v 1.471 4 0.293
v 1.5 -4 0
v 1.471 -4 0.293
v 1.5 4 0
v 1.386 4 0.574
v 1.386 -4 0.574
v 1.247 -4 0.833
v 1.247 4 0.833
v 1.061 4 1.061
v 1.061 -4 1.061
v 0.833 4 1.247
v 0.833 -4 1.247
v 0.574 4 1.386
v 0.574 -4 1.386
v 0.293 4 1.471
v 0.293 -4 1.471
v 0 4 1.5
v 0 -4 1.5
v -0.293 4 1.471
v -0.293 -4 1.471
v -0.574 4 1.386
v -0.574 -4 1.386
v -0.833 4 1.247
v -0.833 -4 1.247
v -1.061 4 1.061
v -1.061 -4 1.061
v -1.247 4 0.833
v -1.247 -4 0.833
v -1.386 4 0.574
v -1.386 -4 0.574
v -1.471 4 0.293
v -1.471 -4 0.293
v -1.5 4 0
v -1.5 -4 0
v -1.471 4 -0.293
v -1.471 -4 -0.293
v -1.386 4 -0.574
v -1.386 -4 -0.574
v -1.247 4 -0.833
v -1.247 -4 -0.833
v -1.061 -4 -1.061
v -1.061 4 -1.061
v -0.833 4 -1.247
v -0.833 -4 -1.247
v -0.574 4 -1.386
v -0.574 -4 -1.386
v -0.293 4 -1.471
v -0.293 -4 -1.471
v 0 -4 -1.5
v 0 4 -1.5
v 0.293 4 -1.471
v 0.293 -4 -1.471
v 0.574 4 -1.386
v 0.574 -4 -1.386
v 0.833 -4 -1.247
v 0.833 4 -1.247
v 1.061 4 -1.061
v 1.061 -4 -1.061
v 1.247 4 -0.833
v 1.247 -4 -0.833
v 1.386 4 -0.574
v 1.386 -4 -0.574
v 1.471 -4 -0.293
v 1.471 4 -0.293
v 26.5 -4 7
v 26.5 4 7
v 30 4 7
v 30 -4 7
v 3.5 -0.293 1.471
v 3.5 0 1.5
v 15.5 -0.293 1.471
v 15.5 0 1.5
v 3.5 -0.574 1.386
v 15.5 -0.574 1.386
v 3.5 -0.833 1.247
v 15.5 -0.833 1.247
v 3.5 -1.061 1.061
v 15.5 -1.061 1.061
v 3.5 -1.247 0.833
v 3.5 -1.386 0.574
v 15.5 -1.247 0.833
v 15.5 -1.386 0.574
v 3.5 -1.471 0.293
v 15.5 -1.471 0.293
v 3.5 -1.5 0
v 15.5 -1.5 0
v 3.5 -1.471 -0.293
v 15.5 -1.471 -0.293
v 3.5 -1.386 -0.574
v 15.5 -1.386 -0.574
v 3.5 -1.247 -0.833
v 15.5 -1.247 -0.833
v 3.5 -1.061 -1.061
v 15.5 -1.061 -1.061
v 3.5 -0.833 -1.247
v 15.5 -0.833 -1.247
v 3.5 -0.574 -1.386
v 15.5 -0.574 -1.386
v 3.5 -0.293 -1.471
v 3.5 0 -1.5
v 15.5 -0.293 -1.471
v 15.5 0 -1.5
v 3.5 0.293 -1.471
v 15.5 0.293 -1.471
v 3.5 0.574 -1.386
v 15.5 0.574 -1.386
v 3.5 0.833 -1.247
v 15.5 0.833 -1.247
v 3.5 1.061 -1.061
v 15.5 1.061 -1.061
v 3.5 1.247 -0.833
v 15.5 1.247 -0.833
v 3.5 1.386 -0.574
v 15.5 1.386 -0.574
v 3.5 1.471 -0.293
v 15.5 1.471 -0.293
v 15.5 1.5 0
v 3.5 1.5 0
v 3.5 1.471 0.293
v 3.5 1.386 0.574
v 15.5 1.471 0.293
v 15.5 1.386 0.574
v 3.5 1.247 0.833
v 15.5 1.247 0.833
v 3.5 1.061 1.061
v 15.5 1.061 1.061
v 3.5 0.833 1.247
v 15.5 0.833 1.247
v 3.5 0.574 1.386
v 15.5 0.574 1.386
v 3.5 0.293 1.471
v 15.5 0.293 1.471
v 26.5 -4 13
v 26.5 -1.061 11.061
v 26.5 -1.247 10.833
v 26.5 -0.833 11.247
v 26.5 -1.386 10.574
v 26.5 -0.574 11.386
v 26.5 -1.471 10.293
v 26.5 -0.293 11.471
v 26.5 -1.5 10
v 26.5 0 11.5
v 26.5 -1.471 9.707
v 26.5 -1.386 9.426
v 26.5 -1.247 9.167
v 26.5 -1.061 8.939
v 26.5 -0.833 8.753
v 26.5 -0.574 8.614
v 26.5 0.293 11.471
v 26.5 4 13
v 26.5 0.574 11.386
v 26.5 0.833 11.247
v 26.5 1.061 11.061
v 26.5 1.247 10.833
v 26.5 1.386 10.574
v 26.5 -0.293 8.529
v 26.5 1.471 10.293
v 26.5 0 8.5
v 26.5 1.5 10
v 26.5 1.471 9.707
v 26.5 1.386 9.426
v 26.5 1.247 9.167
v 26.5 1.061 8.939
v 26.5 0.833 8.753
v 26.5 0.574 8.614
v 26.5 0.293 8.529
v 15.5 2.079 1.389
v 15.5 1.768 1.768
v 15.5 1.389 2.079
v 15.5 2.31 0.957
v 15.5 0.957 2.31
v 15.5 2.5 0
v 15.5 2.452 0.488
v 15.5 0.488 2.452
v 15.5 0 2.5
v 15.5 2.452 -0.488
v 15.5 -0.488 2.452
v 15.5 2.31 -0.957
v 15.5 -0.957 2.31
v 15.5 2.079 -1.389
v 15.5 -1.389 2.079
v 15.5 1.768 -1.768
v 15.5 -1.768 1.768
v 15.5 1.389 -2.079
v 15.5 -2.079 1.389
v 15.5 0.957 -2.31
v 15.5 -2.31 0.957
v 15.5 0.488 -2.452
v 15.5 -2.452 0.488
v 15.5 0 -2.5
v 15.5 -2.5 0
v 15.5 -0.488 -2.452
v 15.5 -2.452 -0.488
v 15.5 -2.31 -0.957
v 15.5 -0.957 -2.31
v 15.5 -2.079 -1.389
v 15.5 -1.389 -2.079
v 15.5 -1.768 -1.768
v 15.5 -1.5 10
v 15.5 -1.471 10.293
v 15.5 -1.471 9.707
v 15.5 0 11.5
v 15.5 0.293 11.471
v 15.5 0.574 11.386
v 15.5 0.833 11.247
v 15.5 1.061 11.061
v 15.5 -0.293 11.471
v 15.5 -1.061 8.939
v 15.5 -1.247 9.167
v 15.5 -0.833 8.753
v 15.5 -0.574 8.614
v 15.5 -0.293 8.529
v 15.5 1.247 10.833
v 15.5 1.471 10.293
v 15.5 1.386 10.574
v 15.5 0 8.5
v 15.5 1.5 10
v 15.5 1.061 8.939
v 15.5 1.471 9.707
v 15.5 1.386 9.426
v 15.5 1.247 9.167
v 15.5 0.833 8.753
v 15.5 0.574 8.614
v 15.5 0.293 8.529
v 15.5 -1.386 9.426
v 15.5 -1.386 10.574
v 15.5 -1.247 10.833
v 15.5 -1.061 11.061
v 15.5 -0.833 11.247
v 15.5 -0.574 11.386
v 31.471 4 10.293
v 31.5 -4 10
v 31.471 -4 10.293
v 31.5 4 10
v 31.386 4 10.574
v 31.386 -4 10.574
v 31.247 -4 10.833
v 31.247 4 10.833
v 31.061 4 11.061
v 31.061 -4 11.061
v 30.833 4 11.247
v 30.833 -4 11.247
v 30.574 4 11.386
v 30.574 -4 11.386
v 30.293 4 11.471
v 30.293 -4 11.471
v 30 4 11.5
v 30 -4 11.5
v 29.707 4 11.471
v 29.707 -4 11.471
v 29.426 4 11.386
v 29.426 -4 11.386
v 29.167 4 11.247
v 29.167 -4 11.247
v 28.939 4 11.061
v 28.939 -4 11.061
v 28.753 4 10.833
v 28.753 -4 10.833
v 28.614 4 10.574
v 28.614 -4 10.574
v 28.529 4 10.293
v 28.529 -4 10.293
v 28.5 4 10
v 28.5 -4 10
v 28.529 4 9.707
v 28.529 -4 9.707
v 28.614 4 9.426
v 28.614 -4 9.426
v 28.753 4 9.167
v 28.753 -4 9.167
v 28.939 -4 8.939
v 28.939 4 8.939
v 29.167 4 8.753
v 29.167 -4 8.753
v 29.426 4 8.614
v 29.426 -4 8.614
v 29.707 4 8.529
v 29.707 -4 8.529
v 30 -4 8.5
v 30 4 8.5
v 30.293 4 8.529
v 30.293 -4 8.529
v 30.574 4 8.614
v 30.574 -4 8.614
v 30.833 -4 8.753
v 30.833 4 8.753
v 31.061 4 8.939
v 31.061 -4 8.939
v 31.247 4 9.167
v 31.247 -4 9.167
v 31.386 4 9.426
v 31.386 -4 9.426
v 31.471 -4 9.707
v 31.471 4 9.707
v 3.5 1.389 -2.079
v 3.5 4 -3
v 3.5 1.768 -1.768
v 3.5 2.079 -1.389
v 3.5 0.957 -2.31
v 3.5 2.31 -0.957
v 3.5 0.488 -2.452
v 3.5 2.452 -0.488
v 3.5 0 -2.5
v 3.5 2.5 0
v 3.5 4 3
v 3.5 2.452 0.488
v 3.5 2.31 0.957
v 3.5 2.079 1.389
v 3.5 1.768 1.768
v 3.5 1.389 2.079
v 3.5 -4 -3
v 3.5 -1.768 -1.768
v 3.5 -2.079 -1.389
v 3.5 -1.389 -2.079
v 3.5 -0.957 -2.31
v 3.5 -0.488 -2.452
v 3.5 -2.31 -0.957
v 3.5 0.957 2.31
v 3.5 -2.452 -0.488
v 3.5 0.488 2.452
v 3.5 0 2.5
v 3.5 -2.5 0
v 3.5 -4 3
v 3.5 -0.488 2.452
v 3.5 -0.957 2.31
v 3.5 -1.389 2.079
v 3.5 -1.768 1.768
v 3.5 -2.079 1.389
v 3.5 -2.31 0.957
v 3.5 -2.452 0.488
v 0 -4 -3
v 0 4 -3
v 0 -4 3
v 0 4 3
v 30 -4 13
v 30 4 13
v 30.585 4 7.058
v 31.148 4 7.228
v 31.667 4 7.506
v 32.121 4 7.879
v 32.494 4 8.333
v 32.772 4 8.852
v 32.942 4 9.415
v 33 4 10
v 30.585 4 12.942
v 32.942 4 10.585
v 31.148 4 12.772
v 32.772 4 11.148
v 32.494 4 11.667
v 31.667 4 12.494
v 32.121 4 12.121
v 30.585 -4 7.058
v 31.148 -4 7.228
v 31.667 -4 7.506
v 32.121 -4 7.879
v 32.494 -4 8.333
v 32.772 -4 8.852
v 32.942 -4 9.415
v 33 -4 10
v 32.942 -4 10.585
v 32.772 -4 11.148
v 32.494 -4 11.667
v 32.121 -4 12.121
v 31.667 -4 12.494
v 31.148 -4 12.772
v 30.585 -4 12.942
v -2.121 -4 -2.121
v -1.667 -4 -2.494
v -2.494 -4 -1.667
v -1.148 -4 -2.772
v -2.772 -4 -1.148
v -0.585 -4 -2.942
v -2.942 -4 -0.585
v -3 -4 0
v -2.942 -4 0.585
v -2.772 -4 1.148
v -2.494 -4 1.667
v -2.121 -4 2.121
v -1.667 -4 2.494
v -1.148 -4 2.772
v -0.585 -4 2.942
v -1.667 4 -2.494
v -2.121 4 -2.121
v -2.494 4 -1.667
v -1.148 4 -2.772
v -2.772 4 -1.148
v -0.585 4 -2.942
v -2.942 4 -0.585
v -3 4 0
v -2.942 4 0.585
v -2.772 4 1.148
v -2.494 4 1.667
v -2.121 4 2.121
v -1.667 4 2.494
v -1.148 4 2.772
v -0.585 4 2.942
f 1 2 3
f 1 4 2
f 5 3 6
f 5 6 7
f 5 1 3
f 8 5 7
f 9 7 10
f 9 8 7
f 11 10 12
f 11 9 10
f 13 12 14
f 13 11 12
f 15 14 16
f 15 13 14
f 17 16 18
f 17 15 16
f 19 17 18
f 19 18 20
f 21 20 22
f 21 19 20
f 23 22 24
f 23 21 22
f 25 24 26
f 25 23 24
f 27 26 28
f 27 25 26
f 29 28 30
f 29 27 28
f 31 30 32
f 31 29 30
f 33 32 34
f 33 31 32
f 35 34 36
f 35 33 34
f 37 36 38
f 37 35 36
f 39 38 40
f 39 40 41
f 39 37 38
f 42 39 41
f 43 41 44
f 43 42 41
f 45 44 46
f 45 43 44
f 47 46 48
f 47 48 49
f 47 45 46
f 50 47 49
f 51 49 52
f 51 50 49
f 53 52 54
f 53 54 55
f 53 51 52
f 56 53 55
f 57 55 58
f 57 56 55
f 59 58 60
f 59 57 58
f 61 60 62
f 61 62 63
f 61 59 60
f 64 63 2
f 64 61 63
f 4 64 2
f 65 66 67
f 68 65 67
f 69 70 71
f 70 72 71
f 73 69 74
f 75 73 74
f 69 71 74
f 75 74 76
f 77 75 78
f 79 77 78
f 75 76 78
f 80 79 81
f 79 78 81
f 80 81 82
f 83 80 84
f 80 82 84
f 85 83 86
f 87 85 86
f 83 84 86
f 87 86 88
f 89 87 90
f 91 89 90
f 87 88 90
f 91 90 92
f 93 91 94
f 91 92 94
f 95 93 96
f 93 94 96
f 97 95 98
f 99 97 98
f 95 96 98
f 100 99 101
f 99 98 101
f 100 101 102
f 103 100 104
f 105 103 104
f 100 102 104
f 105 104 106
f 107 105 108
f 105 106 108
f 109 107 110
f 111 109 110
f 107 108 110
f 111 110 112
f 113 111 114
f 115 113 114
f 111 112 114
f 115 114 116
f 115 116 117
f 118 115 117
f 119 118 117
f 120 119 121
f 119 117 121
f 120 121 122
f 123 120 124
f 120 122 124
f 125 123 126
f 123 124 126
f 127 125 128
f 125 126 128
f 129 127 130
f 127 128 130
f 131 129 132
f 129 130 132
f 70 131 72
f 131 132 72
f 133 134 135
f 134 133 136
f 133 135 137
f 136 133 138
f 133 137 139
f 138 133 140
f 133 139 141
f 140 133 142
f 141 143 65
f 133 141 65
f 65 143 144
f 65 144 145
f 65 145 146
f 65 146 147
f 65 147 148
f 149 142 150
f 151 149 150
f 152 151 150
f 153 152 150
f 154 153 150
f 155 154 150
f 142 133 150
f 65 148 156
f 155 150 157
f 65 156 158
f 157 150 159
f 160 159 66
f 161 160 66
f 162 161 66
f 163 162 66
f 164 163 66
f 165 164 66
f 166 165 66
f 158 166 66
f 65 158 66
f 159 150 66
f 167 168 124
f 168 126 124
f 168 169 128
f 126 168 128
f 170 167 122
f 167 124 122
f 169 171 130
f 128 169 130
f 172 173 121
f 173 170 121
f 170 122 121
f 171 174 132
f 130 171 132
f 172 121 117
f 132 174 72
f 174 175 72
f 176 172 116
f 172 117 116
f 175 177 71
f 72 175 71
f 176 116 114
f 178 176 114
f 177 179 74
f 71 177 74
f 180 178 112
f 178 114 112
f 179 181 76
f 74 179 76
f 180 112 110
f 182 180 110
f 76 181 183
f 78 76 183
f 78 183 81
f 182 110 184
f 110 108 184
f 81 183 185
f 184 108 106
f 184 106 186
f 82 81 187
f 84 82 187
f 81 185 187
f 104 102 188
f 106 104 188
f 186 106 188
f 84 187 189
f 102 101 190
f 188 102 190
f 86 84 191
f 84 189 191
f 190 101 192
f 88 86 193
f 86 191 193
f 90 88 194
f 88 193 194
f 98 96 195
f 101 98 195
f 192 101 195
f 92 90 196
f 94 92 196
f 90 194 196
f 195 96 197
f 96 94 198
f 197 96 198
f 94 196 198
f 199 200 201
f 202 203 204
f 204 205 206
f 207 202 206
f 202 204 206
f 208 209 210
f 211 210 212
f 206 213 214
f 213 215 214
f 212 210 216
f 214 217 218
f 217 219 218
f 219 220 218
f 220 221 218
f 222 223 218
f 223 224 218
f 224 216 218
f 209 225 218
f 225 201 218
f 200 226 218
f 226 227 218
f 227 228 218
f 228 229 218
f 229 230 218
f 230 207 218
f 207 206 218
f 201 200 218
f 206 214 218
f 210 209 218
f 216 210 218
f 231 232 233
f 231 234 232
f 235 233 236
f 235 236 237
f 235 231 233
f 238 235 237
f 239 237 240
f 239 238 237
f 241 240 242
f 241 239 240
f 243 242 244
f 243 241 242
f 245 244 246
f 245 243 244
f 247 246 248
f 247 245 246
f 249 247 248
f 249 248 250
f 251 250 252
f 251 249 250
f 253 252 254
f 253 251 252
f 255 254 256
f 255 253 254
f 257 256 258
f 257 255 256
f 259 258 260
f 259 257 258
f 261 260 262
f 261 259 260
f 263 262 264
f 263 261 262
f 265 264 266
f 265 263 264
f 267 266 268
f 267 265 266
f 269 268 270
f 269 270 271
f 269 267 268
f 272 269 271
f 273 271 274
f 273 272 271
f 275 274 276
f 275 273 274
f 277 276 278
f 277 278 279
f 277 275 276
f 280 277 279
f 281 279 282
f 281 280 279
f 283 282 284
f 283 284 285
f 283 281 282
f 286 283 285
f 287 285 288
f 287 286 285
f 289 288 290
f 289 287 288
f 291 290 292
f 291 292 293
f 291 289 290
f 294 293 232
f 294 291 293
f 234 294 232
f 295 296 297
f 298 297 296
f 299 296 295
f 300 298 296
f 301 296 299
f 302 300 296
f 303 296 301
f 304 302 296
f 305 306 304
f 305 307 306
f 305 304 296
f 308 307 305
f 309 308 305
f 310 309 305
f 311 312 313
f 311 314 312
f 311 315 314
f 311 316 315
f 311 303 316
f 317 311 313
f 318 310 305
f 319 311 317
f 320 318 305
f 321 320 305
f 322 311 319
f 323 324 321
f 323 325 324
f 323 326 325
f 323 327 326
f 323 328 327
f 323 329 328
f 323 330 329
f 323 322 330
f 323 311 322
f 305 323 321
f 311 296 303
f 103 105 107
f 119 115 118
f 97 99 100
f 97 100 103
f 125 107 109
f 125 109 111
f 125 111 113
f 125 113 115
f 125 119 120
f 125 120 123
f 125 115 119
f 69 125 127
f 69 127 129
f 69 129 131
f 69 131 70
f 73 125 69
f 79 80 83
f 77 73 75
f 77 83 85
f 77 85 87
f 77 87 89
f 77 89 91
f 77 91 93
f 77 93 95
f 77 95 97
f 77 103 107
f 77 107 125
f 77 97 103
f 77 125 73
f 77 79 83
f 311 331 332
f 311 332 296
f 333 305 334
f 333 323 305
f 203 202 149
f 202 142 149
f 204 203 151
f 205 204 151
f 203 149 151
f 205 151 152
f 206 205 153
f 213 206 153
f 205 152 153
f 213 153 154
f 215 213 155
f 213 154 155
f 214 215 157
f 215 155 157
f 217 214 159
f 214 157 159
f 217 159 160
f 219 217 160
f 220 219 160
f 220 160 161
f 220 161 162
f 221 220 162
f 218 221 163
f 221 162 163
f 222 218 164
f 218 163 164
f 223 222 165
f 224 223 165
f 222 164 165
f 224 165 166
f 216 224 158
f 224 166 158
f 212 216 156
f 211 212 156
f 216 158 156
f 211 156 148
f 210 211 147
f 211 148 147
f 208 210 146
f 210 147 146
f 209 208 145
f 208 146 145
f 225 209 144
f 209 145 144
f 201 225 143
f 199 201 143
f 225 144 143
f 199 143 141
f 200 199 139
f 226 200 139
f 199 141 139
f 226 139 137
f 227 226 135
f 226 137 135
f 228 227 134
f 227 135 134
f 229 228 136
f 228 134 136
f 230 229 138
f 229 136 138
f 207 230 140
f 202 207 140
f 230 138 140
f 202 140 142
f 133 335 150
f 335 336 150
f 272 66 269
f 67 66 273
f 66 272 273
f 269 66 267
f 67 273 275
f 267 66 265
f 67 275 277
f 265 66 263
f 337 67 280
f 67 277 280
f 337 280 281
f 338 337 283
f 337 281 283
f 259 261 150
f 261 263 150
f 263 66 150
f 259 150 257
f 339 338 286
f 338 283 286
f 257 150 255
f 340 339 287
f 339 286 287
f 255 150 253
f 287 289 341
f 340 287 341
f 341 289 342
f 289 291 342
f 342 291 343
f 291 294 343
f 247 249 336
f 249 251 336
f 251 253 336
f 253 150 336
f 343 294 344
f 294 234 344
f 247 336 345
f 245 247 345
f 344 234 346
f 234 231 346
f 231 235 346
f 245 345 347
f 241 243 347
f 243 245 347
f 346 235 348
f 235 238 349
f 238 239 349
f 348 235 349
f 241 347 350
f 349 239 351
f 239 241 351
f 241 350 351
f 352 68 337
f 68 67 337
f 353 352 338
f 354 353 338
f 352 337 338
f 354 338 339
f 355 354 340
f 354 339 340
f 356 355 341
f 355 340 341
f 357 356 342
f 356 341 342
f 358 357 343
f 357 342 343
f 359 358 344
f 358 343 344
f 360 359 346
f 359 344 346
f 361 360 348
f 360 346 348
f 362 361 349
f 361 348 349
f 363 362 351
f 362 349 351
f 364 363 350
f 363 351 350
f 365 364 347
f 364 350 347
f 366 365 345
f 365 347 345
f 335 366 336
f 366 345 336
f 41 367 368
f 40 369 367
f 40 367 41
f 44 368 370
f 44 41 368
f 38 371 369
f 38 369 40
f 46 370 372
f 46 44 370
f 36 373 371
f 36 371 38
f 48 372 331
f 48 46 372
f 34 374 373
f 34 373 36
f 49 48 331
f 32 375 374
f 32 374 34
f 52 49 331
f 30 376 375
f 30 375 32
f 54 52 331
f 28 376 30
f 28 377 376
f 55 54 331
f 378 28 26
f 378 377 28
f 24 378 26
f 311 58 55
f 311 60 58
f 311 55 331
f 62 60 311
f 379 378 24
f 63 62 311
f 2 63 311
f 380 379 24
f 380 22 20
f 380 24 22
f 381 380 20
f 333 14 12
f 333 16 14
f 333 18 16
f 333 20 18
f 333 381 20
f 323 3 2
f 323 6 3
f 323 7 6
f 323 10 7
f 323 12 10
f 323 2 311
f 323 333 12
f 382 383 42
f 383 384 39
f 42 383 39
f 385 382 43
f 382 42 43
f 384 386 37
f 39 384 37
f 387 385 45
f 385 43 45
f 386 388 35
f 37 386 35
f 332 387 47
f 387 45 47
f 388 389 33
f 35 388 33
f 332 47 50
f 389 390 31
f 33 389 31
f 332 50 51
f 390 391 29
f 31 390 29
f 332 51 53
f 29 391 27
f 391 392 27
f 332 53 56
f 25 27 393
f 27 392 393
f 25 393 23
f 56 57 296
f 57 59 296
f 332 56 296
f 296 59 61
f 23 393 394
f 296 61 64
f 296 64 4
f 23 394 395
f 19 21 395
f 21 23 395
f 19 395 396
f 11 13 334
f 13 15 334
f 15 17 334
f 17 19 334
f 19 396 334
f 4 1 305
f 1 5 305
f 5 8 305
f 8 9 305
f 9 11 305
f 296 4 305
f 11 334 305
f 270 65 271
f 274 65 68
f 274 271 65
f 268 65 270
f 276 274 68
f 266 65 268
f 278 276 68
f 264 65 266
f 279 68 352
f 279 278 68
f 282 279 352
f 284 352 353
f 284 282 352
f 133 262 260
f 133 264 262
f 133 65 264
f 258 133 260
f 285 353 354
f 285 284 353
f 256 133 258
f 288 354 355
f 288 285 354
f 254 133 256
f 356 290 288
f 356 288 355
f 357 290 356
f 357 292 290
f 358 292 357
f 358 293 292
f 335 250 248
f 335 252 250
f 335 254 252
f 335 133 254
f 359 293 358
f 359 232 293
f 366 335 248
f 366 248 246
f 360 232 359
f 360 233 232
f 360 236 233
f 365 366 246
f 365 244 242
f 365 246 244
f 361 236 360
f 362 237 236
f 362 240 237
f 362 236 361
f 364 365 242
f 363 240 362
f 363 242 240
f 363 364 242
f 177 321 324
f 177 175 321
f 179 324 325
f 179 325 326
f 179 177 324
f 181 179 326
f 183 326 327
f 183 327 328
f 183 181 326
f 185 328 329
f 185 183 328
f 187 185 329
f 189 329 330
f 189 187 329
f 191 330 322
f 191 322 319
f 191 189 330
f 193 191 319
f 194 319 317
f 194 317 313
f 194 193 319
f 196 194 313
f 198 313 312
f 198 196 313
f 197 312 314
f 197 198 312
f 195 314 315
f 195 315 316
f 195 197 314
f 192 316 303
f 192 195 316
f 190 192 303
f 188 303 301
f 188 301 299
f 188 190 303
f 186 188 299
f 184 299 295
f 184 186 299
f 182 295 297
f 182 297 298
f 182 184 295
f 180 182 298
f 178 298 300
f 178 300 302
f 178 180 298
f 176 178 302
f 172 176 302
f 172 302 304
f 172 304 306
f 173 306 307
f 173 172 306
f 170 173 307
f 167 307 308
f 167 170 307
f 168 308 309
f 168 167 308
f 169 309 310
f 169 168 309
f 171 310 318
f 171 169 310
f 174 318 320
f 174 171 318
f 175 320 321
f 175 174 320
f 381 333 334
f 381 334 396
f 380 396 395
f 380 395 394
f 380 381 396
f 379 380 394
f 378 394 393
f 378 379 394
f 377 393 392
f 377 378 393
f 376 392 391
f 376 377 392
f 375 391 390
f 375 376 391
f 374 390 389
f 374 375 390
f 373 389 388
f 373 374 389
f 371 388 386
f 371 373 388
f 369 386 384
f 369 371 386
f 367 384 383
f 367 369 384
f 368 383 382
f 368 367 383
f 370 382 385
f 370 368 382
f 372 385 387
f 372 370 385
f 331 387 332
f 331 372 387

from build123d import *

# Parameters (mm, degrees)
F0_R     = 1.5
F1_DEPTH = 4
F0_W     = 12
F0_H     = 1
F0_W_2   = 11
F0_H_2   = 1.5


with BuildPart() as f1:
    # F0 (on Front) → F1 (new body, symmetric)
    with BuildSketch(Plane.XZ):
        with BuildLine():
            Line((26.5, 7), (30, 7))
            ThreePointArc((30, 7), (33, 10), (30, 13))
            Line((30, 13), (26.5, 13))
            Line((26.5, 13), (26.5, 11.5))
            Line((26.5, 11.5), (26.5, 10))
            Line((26.5, 10), (26.5, 7))
        make_face()
        with Locations((30, 10)):
            Circle(F0_R, mode=Mode.SUBTRACT)
        with BuildLine():
            Line((3.5, 3), (0, 3))
            ThreePointArc((0, 3), (-3, 0), (0, -3))
            Line((0, -3), (3.5, -3))
            Line((3.5, -3), (3.5, 1.5))
            Line((3.5, 1.5), (3.5, 2.5))
            Line((3.5, 2.5), (3.5, 3))
        make_face()
        Circle(F0_R, mode=Mode.SUBTRACT)
    extrude(amount=F1_DEPTH, both=True)

    # F0 (on Front) → F2 (revolve)
    with BuildSketch(Plane.XZ):
        with Locations((9.5, 2)):
            Rectangle(F0_W, F0_H)
    revolve(axis=Axis((20.655512, 0, 0), (1, 0, 0)))

    # F0 (on Front) → F3 (revolve)
    with BuildSketch(Plane.XZ):
        with Locations((21, 10.75)):
            Rectangle(F0_W_2, F0_H_2)
    revolve(axis=Axis((21, 0, 10), (-1, 0, 0)))


solid = f1.part
